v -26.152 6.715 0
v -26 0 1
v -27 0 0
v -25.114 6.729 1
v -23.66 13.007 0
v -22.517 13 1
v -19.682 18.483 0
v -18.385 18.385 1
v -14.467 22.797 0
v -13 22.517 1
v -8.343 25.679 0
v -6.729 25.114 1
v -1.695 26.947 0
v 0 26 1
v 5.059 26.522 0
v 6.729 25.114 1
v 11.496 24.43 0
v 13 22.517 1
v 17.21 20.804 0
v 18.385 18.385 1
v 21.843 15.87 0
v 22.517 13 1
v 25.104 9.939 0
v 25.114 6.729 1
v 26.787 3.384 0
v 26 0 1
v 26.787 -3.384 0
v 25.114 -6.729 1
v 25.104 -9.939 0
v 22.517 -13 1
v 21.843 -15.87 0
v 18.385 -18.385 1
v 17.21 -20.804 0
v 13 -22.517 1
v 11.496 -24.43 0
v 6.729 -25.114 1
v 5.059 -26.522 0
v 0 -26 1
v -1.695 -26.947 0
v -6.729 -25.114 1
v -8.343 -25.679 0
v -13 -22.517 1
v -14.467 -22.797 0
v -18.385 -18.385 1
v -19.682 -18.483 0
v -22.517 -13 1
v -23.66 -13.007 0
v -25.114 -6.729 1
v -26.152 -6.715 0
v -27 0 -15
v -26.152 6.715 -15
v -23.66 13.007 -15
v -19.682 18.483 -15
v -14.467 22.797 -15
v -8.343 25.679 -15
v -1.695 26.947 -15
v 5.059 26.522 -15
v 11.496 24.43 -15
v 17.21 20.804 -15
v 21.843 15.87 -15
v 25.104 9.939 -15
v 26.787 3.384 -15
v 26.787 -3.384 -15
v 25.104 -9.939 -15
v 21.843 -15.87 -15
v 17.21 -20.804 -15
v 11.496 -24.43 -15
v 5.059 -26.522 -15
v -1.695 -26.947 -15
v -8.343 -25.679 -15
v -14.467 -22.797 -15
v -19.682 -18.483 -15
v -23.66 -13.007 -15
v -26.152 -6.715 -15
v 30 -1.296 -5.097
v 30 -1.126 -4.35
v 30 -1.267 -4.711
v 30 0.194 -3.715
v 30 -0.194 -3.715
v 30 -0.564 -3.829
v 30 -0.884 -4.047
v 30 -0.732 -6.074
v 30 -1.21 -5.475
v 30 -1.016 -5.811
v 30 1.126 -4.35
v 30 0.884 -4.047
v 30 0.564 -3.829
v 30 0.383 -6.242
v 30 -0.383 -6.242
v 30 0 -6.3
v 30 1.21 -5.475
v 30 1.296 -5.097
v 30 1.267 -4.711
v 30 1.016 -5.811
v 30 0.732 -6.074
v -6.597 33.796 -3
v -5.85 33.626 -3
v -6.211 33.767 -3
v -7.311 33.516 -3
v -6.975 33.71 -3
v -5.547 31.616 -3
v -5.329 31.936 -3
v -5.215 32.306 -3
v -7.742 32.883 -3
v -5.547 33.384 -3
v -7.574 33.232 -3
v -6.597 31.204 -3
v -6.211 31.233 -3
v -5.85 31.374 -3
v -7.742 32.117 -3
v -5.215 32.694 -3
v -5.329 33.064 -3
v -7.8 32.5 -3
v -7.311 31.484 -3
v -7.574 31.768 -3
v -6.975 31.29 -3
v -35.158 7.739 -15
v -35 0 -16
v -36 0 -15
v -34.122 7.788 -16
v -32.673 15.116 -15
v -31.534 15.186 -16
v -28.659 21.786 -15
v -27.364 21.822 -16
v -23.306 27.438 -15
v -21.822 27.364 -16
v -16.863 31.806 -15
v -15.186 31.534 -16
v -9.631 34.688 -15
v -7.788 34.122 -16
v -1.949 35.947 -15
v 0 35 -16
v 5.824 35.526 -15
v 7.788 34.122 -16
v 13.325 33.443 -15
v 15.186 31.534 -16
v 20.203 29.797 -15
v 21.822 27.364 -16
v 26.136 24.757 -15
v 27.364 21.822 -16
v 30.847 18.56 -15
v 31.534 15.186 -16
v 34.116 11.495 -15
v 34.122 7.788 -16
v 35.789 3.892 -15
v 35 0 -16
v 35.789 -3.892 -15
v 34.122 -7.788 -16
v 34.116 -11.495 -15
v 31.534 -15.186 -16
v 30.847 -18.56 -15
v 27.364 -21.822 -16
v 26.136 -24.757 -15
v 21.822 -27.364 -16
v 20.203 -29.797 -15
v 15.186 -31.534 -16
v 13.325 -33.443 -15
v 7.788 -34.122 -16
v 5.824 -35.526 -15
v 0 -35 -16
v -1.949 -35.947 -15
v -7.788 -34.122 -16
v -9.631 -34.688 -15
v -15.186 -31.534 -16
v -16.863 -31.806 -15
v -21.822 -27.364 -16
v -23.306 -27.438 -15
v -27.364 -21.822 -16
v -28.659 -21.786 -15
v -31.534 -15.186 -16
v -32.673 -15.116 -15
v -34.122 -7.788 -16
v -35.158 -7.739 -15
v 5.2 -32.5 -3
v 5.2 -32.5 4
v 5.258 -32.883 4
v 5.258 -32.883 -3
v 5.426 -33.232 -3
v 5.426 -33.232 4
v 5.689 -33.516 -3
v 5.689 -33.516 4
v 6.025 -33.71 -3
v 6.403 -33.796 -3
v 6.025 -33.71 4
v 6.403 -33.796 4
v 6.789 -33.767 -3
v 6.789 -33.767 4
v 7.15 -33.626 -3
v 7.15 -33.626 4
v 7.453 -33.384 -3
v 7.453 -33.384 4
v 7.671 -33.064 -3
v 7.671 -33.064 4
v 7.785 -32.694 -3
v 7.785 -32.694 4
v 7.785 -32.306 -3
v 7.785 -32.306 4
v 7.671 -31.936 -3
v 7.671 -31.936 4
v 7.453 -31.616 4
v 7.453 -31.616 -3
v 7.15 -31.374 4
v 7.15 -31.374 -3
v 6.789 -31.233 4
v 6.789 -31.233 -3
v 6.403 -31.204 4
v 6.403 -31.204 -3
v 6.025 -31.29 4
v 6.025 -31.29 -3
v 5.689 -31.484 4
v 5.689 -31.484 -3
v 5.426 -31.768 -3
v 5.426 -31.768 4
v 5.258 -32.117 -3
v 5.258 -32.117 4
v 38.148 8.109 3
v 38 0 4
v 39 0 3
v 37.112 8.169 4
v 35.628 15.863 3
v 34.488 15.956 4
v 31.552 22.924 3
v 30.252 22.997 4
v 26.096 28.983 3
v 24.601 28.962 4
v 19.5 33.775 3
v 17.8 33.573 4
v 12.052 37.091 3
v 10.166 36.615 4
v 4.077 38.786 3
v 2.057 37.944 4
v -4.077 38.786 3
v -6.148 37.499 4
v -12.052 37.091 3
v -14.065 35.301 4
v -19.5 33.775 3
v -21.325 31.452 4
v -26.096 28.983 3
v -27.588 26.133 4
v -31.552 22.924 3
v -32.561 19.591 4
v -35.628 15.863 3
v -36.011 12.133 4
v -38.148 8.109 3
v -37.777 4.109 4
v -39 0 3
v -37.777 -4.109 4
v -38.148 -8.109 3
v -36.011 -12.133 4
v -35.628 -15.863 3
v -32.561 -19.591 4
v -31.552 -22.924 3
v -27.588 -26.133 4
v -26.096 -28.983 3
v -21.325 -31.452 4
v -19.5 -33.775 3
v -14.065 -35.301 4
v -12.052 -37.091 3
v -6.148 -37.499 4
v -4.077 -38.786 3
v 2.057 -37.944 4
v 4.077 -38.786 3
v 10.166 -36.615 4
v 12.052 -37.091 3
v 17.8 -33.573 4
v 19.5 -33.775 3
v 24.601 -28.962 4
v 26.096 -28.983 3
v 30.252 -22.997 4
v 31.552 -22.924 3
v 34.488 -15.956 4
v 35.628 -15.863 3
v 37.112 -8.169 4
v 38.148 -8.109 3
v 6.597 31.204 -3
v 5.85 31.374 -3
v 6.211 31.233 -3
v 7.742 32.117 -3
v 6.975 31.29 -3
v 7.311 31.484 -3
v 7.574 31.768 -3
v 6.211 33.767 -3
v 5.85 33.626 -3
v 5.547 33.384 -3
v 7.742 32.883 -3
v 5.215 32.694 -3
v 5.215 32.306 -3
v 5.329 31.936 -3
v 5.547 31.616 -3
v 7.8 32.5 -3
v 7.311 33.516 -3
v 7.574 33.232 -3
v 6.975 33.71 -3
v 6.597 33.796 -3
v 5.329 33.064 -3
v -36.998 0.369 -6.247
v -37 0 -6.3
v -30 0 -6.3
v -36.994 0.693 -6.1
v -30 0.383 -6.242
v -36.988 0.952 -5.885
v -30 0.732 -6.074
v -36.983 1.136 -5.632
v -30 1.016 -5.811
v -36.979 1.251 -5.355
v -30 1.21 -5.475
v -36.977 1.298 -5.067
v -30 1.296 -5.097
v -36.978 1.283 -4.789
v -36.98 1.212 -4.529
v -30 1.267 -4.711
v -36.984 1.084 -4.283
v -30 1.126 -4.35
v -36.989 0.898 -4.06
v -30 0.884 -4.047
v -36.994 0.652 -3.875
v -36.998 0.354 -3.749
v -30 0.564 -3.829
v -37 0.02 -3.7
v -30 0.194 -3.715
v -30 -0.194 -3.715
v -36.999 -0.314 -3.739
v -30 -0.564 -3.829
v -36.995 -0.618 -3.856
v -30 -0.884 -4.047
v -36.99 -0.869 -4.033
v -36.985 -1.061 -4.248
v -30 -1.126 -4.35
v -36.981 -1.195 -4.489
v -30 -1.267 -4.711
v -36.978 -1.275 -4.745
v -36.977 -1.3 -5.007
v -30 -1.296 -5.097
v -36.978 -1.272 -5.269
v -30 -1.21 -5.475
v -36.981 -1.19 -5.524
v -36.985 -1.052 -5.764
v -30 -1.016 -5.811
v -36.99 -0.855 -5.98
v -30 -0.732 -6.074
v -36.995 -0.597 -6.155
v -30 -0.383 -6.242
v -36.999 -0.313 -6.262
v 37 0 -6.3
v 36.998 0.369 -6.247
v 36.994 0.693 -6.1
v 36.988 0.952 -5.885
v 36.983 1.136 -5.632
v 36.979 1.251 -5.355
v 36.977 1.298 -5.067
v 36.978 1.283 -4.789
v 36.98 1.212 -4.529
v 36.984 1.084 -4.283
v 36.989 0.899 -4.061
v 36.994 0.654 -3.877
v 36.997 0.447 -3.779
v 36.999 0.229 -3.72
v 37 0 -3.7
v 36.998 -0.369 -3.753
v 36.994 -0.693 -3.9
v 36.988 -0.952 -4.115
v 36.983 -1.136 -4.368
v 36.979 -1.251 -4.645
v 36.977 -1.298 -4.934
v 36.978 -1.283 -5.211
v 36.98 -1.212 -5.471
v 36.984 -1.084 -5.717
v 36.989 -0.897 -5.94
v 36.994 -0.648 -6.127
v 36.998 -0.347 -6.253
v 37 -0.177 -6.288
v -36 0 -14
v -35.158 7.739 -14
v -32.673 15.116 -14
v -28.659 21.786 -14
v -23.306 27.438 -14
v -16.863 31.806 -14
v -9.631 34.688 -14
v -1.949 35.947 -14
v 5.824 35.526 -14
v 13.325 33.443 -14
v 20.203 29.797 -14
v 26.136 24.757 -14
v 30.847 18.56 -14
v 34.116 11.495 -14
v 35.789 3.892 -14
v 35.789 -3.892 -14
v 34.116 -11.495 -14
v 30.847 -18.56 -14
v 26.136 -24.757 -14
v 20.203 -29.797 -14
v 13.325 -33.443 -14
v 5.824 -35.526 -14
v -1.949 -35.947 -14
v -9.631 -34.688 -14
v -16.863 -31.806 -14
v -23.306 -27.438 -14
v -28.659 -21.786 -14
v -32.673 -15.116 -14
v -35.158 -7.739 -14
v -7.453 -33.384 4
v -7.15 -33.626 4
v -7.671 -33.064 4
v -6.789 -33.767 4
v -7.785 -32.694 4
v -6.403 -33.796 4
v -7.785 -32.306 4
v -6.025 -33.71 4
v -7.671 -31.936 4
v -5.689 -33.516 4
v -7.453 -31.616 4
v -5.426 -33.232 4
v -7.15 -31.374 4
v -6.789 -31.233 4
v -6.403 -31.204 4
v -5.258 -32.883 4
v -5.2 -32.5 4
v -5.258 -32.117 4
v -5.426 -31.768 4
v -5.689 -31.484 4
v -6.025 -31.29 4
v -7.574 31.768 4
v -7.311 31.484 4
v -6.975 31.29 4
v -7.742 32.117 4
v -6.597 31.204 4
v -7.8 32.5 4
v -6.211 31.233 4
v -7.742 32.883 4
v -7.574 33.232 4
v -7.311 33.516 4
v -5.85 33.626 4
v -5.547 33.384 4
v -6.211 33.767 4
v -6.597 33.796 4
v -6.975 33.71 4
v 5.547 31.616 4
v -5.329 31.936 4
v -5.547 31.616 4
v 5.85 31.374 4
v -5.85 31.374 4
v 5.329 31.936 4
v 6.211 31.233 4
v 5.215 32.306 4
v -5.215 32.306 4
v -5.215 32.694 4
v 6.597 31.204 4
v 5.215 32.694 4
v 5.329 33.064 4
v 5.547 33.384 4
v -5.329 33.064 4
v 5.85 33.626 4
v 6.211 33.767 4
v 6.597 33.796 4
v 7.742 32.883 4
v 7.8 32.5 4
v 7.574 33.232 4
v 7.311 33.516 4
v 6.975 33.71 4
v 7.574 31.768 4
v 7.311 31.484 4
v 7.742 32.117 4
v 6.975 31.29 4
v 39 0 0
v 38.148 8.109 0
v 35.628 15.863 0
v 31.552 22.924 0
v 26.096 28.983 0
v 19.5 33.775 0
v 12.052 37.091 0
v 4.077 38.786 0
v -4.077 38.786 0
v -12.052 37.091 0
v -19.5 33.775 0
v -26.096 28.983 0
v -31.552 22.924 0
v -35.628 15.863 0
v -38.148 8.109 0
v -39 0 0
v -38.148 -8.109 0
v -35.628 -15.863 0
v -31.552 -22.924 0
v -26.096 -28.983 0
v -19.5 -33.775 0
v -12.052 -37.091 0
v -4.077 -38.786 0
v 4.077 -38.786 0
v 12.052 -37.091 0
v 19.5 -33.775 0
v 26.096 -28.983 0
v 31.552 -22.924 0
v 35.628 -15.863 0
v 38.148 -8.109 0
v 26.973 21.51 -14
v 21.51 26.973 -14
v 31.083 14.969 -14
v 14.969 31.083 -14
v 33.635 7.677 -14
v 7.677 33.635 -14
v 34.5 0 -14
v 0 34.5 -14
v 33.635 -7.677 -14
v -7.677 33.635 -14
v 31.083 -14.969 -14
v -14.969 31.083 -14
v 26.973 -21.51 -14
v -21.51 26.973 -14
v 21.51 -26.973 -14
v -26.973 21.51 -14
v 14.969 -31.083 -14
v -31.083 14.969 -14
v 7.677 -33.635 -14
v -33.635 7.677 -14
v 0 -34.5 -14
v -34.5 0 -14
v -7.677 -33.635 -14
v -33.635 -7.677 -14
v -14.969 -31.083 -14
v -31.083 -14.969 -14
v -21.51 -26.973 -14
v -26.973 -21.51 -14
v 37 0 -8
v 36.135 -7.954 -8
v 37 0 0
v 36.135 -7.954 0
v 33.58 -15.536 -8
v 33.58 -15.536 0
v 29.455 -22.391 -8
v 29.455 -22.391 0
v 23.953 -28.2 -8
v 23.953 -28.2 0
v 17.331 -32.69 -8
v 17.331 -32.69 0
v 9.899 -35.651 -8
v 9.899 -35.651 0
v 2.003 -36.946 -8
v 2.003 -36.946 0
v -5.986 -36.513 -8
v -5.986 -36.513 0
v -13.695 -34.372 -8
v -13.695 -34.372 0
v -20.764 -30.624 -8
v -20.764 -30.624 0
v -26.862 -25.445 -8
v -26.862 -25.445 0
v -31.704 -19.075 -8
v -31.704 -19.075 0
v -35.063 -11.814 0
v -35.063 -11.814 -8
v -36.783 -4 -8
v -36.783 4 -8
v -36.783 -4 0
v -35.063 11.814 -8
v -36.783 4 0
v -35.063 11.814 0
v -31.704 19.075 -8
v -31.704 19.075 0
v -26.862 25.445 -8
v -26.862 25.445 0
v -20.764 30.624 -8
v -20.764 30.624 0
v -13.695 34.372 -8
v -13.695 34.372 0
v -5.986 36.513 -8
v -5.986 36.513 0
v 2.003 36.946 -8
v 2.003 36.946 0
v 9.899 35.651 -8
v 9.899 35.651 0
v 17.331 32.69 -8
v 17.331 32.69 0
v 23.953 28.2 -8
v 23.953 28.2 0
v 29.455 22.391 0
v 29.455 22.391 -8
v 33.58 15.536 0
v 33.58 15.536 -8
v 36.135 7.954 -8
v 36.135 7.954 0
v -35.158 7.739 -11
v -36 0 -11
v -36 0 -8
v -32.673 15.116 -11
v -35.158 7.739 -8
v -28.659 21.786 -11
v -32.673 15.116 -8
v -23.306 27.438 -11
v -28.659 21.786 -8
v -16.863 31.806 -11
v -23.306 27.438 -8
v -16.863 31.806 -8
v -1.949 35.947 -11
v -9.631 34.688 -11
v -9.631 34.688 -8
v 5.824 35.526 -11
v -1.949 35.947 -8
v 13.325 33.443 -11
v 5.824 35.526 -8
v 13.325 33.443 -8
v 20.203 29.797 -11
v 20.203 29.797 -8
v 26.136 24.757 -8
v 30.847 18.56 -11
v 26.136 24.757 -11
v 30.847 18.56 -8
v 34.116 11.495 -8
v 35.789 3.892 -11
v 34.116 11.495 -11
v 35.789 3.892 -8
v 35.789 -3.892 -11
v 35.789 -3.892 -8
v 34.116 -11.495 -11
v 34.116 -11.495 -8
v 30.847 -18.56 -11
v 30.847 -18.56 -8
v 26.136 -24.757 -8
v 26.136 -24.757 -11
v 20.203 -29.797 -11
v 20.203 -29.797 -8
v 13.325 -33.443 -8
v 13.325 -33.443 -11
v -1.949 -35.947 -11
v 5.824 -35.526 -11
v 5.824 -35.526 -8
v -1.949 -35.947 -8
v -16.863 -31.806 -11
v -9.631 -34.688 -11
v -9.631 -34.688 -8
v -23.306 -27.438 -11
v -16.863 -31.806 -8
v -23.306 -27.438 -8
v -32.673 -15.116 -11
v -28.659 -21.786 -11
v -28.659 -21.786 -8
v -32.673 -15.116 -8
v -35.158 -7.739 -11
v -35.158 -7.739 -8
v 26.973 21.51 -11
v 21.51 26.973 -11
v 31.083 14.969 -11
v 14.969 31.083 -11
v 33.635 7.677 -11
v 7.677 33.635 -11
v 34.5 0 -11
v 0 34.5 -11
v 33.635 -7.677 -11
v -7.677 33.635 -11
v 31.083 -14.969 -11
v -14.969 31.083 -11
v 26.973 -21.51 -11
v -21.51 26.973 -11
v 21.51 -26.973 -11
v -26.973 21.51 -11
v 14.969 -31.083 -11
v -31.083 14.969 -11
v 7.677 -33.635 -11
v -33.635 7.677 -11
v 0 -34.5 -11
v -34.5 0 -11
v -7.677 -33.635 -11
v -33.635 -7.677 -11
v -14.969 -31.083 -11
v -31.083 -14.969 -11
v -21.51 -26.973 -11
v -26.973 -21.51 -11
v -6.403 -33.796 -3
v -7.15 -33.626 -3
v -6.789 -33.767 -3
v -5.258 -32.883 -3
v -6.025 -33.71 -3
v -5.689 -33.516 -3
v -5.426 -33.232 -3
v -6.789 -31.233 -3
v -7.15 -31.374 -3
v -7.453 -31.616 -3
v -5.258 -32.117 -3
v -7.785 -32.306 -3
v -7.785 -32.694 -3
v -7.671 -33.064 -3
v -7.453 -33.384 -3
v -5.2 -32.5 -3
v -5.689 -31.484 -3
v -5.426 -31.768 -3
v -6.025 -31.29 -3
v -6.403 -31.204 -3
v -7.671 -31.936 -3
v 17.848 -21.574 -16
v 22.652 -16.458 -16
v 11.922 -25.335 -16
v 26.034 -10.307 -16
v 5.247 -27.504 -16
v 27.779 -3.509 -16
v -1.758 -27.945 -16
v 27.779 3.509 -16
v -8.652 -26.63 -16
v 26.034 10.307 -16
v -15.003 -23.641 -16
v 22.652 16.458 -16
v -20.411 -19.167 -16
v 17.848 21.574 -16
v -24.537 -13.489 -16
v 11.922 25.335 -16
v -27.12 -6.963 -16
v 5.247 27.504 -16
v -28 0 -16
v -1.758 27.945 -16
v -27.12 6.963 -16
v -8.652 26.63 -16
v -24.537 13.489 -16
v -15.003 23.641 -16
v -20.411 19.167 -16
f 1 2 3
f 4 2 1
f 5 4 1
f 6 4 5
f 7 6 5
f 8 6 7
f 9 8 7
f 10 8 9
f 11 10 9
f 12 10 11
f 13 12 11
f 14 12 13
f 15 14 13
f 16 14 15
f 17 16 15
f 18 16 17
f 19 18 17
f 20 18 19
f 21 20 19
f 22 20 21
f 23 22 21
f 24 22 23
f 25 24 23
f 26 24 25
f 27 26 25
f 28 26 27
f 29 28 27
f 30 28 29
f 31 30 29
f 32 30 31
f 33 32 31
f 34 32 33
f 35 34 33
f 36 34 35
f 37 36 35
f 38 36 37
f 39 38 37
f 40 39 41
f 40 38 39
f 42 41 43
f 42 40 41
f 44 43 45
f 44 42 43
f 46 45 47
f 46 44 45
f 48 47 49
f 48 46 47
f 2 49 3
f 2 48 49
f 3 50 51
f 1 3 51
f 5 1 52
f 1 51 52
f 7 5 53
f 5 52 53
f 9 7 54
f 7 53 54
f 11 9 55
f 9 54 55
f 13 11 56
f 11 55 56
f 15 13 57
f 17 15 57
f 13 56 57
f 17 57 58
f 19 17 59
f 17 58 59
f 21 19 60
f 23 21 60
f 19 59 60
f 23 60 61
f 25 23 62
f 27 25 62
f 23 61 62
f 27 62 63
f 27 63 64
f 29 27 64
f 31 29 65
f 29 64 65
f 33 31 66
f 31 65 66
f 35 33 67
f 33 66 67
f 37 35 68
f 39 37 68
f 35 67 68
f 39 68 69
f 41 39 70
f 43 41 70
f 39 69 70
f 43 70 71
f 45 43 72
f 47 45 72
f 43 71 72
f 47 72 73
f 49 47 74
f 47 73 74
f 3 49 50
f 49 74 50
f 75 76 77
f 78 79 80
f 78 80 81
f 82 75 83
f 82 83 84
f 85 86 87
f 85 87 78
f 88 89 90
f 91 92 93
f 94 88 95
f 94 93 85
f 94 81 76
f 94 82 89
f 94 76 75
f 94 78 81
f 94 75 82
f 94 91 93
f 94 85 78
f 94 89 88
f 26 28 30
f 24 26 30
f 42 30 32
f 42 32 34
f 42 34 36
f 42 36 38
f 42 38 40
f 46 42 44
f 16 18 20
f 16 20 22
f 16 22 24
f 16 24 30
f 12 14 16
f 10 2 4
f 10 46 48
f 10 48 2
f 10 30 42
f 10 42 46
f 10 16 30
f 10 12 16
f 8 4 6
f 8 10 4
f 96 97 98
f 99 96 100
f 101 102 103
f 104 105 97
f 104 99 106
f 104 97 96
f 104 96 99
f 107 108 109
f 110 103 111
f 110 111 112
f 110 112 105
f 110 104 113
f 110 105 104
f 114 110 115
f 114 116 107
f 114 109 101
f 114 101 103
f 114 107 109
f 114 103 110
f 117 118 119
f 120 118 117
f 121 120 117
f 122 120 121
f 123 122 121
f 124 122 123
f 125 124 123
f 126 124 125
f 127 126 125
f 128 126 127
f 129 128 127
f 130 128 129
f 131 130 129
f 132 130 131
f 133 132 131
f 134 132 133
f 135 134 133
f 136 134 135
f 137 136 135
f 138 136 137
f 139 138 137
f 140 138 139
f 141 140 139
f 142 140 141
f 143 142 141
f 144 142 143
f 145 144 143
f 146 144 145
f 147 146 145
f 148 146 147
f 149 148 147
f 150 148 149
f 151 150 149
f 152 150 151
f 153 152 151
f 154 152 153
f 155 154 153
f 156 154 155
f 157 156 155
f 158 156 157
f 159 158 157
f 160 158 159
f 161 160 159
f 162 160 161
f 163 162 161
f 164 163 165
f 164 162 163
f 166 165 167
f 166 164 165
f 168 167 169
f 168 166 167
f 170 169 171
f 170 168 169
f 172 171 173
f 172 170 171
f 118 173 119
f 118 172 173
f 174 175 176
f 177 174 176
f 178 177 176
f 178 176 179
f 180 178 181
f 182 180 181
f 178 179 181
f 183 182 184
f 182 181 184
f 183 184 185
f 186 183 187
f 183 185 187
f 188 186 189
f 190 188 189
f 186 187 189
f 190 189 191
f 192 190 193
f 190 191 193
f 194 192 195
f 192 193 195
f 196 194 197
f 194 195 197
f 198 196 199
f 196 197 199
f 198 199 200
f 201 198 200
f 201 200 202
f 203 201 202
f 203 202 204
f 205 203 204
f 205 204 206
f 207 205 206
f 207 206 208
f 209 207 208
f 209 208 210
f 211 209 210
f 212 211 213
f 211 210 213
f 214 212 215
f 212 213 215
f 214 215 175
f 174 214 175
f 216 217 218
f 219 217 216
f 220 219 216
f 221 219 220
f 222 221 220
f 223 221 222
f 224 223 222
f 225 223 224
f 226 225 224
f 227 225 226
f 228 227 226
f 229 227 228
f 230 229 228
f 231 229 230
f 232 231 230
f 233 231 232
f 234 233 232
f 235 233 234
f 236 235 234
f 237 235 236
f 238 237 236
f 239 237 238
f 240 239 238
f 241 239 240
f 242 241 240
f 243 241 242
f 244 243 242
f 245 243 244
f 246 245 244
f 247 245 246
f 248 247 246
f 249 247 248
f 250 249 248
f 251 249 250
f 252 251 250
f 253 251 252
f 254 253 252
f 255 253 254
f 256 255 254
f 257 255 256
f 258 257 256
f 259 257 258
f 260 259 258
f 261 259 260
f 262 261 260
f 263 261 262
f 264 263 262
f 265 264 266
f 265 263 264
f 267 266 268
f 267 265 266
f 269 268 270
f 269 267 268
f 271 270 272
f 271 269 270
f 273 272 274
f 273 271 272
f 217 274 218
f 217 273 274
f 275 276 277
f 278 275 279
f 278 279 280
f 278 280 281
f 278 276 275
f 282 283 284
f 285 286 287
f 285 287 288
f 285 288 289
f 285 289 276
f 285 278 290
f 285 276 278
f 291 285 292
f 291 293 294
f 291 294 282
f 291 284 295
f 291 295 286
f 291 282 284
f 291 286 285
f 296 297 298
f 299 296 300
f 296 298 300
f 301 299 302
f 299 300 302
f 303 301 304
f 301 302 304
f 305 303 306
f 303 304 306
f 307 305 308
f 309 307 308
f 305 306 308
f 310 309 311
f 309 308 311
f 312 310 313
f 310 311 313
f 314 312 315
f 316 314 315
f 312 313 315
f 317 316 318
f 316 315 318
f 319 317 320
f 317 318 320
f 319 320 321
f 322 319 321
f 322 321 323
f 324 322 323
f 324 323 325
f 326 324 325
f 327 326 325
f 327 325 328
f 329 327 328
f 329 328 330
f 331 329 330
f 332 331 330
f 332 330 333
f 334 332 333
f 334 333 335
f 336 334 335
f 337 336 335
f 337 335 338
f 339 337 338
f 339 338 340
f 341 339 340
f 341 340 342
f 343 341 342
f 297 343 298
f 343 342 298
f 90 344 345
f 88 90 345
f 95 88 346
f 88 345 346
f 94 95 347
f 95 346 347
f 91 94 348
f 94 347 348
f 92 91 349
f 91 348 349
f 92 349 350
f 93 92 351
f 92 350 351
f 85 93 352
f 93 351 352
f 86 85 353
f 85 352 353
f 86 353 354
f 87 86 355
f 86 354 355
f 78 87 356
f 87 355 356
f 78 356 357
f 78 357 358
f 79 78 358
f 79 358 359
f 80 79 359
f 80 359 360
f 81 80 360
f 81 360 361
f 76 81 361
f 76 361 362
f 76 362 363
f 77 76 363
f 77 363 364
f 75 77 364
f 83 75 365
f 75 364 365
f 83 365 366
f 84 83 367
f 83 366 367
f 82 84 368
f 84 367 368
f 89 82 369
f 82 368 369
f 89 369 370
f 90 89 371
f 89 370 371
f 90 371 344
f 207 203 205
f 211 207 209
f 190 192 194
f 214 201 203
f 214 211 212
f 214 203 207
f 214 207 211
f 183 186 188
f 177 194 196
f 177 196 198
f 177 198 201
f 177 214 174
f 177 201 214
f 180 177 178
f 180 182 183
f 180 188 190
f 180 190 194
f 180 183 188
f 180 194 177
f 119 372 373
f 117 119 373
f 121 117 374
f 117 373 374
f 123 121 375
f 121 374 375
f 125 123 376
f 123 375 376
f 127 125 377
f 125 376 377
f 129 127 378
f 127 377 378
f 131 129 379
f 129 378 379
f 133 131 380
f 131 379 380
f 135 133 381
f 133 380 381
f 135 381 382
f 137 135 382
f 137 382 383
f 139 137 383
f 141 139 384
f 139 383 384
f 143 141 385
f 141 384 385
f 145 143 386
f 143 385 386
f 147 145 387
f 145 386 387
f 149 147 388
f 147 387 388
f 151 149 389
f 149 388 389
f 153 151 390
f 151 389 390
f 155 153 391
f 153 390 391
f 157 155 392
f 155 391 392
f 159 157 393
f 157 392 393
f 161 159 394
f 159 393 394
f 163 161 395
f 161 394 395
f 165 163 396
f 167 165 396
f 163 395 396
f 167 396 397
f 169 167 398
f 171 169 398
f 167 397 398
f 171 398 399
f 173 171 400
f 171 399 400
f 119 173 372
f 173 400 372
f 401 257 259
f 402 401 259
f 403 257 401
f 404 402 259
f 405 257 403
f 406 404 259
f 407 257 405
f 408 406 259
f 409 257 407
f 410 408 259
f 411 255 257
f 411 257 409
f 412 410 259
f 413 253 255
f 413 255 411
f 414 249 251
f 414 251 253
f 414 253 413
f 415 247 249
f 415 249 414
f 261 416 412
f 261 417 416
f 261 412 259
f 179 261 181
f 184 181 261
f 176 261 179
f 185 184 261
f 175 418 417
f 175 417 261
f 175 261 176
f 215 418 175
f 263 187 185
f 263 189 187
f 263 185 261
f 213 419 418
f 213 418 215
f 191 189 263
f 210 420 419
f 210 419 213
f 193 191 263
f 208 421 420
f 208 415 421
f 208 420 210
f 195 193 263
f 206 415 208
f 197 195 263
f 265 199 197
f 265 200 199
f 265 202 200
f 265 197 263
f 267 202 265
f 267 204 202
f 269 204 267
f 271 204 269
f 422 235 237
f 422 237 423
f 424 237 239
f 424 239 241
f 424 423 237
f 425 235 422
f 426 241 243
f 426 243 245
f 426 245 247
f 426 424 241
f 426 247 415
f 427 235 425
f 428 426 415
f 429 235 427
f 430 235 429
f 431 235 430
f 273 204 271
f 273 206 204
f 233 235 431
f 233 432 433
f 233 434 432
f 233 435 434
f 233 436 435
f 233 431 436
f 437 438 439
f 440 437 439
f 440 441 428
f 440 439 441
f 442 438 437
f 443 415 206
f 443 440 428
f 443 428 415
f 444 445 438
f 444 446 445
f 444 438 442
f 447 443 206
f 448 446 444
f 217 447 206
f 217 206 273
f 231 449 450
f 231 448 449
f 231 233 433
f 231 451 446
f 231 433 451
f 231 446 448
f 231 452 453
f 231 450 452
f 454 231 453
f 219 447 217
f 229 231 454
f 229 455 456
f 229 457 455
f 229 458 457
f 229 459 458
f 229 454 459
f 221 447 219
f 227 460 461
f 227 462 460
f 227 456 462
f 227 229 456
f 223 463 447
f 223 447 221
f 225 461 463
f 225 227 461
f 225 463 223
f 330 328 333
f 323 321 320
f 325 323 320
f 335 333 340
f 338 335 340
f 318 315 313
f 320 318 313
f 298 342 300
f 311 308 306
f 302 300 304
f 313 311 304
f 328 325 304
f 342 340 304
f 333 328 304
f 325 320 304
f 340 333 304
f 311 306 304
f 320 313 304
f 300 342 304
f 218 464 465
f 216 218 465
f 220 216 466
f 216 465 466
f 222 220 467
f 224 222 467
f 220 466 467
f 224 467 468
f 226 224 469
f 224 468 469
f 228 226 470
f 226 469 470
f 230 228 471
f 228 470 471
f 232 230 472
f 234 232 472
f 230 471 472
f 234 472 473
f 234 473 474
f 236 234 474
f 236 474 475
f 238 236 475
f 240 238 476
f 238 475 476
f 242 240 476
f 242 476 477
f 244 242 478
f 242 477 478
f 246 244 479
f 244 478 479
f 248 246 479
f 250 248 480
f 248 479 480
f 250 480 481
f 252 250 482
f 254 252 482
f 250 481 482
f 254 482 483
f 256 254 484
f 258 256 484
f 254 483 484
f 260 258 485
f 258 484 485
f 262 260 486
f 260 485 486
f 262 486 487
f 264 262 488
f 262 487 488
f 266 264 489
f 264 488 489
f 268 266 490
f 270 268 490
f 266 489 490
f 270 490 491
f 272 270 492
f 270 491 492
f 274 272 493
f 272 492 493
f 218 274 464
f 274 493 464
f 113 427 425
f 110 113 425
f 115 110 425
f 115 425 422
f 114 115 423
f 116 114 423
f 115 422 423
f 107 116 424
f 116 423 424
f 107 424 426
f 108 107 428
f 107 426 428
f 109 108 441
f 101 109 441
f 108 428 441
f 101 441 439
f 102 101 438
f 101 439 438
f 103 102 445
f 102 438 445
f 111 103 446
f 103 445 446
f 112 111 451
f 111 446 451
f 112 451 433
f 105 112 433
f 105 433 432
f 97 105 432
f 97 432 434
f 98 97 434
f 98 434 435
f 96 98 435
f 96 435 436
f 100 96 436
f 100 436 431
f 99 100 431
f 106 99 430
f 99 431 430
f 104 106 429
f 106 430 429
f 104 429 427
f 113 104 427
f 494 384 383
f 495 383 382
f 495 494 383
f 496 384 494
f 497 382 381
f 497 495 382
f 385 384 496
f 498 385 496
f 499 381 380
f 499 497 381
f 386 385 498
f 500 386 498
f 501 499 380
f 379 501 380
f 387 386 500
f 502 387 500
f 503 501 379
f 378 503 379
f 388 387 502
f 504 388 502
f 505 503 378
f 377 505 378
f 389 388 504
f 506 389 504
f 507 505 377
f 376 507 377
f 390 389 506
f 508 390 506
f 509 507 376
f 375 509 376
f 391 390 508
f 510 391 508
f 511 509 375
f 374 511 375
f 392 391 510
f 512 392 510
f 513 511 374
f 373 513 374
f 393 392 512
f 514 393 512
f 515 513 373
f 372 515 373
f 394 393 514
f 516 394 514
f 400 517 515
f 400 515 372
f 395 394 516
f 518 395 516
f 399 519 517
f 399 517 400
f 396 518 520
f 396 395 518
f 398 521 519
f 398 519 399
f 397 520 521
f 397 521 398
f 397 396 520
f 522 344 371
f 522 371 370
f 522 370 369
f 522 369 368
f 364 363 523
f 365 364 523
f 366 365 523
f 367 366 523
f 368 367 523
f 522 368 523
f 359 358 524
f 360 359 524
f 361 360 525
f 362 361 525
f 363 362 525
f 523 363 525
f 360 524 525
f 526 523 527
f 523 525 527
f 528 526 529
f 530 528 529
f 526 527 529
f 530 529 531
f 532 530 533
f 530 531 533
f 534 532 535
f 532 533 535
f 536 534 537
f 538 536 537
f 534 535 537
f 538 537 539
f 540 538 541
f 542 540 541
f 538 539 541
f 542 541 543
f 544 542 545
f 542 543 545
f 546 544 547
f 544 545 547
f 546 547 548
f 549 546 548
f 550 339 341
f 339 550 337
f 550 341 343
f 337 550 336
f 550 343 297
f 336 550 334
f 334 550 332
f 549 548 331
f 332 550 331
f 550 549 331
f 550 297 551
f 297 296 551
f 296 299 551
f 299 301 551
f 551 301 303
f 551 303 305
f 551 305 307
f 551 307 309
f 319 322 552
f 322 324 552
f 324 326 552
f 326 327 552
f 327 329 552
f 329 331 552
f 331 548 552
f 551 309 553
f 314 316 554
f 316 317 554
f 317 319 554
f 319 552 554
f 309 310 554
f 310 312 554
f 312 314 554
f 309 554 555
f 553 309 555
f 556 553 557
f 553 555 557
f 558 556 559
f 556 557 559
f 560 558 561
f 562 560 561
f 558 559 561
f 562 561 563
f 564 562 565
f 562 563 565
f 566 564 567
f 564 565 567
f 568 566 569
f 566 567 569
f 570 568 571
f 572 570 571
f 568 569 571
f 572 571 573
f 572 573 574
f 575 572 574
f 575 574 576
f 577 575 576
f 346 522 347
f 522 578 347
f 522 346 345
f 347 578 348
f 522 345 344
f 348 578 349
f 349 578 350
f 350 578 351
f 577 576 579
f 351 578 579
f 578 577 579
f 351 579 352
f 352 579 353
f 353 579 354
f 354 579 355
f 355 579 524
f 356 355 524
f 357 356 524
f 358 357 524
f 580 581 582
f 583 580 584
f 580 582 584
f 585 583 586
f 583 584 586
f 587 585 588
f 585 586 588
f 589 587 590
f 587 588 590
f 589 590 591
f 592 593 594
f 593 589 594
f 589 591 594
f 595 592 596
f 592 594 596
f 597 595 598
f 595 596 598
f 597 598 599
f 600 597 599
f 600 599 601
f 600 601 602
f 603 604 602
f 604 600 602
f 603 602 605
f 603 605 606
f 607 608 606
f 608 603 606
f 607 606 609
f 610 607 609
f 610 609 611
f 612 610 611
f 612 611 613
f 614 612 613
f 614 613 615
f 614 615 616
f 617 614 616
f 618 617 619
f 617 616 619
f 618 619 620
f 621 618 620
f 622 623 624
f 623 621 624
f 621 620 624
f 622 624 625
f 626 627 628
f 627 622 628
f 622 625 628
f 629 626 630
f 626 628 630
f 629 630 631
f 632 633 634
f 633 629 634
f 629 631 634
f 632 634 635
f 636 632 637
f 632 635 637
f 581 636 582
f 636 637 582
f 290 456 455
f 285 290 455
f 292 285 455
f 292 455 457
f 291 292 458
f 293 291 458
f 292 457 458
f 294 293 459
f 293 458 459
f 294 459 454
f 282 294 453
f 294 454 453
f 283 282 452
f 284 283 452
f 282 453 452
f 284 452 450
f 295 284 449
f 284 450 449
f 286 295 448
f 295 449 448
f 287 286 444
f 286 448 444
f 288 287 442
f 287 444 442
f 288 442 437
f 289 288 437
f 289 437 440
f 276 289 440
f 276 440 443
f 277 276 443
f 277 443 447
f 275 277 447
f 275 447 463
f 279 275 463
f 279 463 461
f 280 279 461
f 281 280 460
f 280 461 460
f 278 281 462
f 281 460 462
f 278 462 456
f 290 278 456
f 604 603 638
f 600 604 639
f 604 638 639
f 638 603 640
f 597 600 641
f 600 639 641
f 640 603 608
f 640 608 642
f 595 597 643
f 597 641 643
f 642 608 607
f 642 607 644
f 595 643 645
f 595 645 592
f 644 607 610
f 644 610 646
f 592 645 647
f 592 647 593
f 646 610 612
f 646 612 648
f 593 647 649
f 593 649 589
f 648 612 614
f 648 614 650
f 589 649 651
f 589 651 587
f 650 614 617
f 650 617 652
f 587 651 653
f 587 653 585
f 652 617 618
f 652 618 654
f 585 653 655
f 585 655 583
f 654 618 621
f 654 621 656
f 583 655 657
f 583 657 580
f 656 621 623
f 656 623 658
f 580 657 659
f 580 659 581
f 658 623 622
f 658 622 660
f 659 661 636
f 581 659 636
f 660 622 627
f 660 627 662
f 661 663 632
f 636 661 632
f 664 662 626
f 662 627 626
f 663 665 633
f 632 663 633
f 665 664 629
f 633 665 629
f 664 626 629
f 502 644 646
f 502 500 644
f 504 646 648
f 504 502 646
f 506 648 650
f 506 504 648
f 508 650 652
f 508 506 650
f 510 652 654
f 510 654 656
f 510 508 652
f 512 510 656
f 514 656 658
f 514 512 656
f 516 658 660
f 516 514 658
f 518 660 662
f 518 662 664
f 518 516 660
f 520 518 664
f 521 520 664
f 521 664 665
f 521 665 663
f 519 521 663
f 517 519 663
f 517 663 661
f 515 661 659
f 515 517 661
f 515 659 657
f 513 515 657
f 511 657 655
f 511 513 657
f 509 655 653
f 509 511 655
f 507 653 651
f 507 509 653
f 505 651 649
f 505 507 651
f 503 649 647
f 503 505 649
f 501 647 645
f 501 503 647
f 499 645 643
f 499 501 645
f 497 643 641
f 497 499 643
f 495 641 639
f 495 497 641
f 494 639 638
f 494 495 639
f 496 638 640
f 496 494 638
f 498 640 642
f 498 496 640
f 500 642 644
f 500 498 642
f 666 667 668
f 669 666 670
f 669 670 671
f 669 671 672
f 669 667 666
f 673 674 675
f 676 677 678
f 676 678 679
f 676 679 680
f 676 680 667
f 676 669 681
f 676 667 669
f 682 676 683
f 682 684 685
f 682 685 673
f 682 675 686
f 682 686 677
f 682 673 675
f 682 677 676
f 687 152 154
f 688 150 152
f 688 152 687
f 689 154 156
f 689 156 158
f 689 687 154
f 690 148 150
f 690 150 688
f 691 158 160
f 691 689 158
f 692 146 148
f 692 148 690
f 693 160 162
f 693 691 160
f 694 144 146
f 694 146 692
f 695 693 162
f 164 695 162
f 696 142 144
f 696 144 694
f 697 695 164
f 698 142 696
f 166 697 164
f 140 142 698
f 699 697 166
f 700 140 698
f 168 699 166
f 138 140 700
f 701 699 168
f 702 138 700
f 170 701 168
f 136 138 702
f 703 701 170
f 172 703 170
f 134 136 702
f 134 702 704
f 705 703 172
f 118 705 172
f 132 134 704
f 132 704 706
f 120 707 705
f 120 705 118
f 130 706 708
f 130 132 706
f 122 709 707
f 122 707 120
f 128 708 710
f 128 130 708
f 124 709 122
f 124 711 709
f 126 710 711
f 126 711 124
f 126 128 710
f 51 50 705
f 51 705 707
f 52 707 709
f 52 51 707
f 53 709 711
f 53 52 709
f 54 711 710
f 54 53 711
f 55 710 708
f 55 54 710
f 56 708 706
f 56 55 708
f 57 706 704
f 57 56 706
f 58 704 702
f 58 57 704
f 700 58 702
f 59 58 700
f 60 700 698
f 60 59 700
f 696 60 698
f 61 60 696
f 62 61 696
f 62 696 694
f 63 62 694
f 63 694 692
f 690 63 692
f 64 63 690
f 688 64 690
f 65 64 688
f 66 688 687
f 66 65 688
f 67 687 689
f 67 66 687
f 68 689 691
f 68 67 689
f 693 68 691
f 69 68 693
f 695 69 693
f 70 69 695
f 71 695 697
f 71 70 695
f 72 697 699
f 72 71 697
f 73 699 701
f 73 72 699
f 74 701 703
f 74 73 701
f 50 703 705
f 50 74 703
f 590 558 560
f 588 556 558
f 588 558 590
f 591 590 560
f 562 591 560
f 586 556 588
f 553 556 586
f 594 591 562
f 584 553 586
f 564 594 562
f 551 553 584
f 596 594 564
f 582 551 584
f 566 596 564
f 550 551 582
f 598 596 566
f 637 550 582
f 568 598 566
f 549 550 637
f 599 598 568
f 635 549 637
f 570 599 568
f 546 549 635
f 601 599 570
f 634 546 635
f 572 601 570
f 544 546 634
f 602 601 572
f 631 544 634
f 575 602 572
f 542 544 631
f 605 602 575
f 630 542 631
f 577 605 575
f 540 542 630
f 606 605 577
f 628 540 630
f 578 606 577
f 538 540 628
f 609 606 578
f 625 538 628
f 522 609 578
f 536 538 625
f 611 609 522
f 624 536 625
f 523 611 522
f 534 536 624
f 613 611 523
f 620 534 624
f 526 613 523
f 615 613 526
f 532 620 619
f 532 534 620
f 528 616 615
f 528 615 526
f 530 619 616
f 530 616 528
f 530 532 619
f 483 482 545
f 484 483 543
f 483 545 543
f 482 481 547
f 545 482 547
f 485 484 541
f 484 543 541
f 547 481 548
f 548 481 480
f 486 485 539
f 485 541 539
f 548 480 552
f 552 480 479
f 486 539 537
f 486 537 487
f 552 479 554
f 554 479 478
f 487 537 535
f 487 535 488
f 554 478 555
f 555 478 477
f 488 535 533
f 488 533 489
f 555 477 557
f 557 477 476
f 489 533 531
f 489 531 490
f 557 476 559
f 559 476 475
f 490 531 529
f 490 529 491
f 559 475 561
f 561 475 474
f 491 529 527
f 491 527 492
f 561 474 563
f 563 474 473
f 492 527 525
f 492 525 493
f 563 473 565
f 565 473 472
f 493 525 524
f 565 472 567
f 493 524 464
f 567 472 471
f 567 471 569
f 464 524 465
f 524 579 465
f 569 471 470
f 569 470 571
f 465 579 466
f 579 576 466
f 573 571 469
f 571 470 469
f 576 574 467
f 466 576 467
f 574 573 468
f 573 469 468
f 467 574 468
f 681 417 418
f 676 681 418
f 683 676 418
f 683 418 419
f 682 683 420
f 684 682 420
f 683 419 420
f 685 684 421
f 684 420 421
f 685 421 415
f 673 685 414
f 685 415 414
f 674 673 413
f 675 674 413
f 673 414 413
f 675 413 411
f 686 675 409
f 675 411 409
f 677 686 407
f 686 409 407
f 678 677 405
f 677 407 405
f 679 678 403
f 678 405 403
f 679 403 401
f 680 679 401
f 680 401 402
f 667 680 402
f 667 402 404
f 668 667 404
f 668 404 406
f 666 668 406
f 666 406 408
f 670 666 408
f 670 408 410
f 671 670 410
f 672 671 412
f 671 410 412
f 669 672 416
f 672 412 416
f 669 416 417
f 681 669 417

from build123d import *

# Parameters (mm, degrees)
SKETCH_1_R          = 39
EXTRUDE_1_DEPTH     = 4
SKETCH_3_R          = 37
EXTRUDE_2_DEPTH     = 8
SKETCH_4_R          = 36
EXTRUDE_3_DEPTH     = 8
SKETCH_5_W          = 3
SKETCH_5_H          = 1.5
SKETCH_7_R          = 27
CUT_EXTRUDE_1_DEPTH = 17
CHAMFER_2_SIZE      = 1
SKETCH_14_R         = 1.3
CUT_EXTRUDE_4_DEPTH = 7
CUT_EXTRUDE_START   = 7
SKETCH_16_R         = 1.3
CUT_EXTRUDE_5_DEPTH = 7
SKETCH_18_R         = 1.3
CUT_EXTRUDE_6_DEPTH = 7
CHAMFER_3_SIZE      = 1


with BuildPart() as part:
    # Sketch 1 → Бобышка-Вытянуть1 (new body)
    with BuildSketch(Plane.XY):
        Circle(SKETCH_1_R)
    extrude(amount=EXTRUDE_1_DEPTH)

    # Эскиз3 → Бобышка-Вытянуть2 (add)
    with BuildSketch(Plane(origin=(0, 0, 0), x_dir=(-1, 0, 0), z_dir=(0, 0, -1))):
        with Locations(Location((0, 0, 0), (0, 0, 180))):
            Circle(SKETCH_3_R)
    extrude(amount=EXTRUDE_2_DEPTH)

    # Эскиз4 → Бобышка-Вытянуть3 (add)
    with BuildSketch(Plane(origin=(0, 0, -8), x_dir=(-1, 0, 0), z_dir=(0, 0, -1))):
        Circle(SKETCH_4_R)
    extrude(amount=EXTRUDE_3_DEPTH)

    # Эскиз5 → Вырез-Повернуть1 (revolve, cut)
    with BuildSketch(Plane(origin=(0, 0, 0), x_dir=(0, 0, -1), z_dir=(1, 0, 0)), mode=Mode.PRIVATE) as cut_revolve_1_sk:
        with Locations((12.5, 35.25)):
            Rectangle(SKETCH_5_W, SKETCH_5_H)
    revolve(cut_revolve_1_sk.sketch.rotate(Axis((0, 0, 46.650977883), (0, 0, -1)), 90), axis=Axis((0, 0, 46.650977883), (0, 0, -1)), mode=Mode.SUBTRACT)

    # Эскиз7 → Вырез-Вытянуть1 (cut)
    with BuildSketch(Plane(origin=(0, 0, -16), x_dir=(-1, 0, 0), z_dir=(0, 0, -1))):
        Circle(SKETCH_7_R)
    extrude(amount=-CUT_EXTRUDE_1_DEPTH, mode=Mode.SUBTRACT)

    # Фаска2
    chamfer_2_edges = [part.edges().sort_by_distance(p)[0] for p in [
        (36, 0, -16),
    ]]
    chamfer(chamfer_2_edges, length=CHAMFER_2_SIZE)

    # Эскиз14 → Вырез-Вытянуть4 (cut)
    with BuildSketch(Plane(origin=(37, 0, 0), x_dir=(0, 0, -1), z_dir=(1, 0, 0))):
        with Locations((5, 0)):
            Circle(SKETCH_14_R)
    extrude(amount=-CUT_EXTRUDE_4_DEPTH, mode=Mode.SUBTRACT)

    # Эскиз16 → Вырез-Вытянуть5 (cut)
    with BuildSketch(Plane(origin=(-37, 0, 0), x_dir=(0, 0, -1), z_dir=(1, 0, 0)).offset(CUT_EXTRUDE_START)):
        with Locations((5, 0)):
            Circle(SKETCH_16_R)
    extrude(amount=-CUT_EXTRUDE_5_DEPTH, mode=Mode.SUBTRACT)

    # Эскиз18 → Вырез-Вытянуть6 (cut)
    with BuildSketch(Plane.XY.offset(4)):
        with Locations((6.5, 32.5)):
            Circle(SKETCH_18_R)
        with Locations(Location((-6.5, 32.5, 0), (0, 0, 180))):
            Circle(SKETCH_18_R)
        with Locations(Location((6.5, -32.5, 0), (0, 0, 180))):
            Circle(SKETCH_18_R)
        with Locations((-6.5, -32.5)):
            Circle(SKETCH_18_R)
    extrude(amount=-CUT_EXTRUDE_6_DEPTH, mode=Mode.SUBTRACT)

    # Фаска3
    chamfer_3_edges = [part.edges().sort_by_distance(p)[0] for p in [
        (27, 0, 1),
        (27, 0, -16),
        (-39, 0, 4),
    ]]
    chamfer(chamfer_3_edges, length=CHAMFER_3_SIZE)


solid = part.part
